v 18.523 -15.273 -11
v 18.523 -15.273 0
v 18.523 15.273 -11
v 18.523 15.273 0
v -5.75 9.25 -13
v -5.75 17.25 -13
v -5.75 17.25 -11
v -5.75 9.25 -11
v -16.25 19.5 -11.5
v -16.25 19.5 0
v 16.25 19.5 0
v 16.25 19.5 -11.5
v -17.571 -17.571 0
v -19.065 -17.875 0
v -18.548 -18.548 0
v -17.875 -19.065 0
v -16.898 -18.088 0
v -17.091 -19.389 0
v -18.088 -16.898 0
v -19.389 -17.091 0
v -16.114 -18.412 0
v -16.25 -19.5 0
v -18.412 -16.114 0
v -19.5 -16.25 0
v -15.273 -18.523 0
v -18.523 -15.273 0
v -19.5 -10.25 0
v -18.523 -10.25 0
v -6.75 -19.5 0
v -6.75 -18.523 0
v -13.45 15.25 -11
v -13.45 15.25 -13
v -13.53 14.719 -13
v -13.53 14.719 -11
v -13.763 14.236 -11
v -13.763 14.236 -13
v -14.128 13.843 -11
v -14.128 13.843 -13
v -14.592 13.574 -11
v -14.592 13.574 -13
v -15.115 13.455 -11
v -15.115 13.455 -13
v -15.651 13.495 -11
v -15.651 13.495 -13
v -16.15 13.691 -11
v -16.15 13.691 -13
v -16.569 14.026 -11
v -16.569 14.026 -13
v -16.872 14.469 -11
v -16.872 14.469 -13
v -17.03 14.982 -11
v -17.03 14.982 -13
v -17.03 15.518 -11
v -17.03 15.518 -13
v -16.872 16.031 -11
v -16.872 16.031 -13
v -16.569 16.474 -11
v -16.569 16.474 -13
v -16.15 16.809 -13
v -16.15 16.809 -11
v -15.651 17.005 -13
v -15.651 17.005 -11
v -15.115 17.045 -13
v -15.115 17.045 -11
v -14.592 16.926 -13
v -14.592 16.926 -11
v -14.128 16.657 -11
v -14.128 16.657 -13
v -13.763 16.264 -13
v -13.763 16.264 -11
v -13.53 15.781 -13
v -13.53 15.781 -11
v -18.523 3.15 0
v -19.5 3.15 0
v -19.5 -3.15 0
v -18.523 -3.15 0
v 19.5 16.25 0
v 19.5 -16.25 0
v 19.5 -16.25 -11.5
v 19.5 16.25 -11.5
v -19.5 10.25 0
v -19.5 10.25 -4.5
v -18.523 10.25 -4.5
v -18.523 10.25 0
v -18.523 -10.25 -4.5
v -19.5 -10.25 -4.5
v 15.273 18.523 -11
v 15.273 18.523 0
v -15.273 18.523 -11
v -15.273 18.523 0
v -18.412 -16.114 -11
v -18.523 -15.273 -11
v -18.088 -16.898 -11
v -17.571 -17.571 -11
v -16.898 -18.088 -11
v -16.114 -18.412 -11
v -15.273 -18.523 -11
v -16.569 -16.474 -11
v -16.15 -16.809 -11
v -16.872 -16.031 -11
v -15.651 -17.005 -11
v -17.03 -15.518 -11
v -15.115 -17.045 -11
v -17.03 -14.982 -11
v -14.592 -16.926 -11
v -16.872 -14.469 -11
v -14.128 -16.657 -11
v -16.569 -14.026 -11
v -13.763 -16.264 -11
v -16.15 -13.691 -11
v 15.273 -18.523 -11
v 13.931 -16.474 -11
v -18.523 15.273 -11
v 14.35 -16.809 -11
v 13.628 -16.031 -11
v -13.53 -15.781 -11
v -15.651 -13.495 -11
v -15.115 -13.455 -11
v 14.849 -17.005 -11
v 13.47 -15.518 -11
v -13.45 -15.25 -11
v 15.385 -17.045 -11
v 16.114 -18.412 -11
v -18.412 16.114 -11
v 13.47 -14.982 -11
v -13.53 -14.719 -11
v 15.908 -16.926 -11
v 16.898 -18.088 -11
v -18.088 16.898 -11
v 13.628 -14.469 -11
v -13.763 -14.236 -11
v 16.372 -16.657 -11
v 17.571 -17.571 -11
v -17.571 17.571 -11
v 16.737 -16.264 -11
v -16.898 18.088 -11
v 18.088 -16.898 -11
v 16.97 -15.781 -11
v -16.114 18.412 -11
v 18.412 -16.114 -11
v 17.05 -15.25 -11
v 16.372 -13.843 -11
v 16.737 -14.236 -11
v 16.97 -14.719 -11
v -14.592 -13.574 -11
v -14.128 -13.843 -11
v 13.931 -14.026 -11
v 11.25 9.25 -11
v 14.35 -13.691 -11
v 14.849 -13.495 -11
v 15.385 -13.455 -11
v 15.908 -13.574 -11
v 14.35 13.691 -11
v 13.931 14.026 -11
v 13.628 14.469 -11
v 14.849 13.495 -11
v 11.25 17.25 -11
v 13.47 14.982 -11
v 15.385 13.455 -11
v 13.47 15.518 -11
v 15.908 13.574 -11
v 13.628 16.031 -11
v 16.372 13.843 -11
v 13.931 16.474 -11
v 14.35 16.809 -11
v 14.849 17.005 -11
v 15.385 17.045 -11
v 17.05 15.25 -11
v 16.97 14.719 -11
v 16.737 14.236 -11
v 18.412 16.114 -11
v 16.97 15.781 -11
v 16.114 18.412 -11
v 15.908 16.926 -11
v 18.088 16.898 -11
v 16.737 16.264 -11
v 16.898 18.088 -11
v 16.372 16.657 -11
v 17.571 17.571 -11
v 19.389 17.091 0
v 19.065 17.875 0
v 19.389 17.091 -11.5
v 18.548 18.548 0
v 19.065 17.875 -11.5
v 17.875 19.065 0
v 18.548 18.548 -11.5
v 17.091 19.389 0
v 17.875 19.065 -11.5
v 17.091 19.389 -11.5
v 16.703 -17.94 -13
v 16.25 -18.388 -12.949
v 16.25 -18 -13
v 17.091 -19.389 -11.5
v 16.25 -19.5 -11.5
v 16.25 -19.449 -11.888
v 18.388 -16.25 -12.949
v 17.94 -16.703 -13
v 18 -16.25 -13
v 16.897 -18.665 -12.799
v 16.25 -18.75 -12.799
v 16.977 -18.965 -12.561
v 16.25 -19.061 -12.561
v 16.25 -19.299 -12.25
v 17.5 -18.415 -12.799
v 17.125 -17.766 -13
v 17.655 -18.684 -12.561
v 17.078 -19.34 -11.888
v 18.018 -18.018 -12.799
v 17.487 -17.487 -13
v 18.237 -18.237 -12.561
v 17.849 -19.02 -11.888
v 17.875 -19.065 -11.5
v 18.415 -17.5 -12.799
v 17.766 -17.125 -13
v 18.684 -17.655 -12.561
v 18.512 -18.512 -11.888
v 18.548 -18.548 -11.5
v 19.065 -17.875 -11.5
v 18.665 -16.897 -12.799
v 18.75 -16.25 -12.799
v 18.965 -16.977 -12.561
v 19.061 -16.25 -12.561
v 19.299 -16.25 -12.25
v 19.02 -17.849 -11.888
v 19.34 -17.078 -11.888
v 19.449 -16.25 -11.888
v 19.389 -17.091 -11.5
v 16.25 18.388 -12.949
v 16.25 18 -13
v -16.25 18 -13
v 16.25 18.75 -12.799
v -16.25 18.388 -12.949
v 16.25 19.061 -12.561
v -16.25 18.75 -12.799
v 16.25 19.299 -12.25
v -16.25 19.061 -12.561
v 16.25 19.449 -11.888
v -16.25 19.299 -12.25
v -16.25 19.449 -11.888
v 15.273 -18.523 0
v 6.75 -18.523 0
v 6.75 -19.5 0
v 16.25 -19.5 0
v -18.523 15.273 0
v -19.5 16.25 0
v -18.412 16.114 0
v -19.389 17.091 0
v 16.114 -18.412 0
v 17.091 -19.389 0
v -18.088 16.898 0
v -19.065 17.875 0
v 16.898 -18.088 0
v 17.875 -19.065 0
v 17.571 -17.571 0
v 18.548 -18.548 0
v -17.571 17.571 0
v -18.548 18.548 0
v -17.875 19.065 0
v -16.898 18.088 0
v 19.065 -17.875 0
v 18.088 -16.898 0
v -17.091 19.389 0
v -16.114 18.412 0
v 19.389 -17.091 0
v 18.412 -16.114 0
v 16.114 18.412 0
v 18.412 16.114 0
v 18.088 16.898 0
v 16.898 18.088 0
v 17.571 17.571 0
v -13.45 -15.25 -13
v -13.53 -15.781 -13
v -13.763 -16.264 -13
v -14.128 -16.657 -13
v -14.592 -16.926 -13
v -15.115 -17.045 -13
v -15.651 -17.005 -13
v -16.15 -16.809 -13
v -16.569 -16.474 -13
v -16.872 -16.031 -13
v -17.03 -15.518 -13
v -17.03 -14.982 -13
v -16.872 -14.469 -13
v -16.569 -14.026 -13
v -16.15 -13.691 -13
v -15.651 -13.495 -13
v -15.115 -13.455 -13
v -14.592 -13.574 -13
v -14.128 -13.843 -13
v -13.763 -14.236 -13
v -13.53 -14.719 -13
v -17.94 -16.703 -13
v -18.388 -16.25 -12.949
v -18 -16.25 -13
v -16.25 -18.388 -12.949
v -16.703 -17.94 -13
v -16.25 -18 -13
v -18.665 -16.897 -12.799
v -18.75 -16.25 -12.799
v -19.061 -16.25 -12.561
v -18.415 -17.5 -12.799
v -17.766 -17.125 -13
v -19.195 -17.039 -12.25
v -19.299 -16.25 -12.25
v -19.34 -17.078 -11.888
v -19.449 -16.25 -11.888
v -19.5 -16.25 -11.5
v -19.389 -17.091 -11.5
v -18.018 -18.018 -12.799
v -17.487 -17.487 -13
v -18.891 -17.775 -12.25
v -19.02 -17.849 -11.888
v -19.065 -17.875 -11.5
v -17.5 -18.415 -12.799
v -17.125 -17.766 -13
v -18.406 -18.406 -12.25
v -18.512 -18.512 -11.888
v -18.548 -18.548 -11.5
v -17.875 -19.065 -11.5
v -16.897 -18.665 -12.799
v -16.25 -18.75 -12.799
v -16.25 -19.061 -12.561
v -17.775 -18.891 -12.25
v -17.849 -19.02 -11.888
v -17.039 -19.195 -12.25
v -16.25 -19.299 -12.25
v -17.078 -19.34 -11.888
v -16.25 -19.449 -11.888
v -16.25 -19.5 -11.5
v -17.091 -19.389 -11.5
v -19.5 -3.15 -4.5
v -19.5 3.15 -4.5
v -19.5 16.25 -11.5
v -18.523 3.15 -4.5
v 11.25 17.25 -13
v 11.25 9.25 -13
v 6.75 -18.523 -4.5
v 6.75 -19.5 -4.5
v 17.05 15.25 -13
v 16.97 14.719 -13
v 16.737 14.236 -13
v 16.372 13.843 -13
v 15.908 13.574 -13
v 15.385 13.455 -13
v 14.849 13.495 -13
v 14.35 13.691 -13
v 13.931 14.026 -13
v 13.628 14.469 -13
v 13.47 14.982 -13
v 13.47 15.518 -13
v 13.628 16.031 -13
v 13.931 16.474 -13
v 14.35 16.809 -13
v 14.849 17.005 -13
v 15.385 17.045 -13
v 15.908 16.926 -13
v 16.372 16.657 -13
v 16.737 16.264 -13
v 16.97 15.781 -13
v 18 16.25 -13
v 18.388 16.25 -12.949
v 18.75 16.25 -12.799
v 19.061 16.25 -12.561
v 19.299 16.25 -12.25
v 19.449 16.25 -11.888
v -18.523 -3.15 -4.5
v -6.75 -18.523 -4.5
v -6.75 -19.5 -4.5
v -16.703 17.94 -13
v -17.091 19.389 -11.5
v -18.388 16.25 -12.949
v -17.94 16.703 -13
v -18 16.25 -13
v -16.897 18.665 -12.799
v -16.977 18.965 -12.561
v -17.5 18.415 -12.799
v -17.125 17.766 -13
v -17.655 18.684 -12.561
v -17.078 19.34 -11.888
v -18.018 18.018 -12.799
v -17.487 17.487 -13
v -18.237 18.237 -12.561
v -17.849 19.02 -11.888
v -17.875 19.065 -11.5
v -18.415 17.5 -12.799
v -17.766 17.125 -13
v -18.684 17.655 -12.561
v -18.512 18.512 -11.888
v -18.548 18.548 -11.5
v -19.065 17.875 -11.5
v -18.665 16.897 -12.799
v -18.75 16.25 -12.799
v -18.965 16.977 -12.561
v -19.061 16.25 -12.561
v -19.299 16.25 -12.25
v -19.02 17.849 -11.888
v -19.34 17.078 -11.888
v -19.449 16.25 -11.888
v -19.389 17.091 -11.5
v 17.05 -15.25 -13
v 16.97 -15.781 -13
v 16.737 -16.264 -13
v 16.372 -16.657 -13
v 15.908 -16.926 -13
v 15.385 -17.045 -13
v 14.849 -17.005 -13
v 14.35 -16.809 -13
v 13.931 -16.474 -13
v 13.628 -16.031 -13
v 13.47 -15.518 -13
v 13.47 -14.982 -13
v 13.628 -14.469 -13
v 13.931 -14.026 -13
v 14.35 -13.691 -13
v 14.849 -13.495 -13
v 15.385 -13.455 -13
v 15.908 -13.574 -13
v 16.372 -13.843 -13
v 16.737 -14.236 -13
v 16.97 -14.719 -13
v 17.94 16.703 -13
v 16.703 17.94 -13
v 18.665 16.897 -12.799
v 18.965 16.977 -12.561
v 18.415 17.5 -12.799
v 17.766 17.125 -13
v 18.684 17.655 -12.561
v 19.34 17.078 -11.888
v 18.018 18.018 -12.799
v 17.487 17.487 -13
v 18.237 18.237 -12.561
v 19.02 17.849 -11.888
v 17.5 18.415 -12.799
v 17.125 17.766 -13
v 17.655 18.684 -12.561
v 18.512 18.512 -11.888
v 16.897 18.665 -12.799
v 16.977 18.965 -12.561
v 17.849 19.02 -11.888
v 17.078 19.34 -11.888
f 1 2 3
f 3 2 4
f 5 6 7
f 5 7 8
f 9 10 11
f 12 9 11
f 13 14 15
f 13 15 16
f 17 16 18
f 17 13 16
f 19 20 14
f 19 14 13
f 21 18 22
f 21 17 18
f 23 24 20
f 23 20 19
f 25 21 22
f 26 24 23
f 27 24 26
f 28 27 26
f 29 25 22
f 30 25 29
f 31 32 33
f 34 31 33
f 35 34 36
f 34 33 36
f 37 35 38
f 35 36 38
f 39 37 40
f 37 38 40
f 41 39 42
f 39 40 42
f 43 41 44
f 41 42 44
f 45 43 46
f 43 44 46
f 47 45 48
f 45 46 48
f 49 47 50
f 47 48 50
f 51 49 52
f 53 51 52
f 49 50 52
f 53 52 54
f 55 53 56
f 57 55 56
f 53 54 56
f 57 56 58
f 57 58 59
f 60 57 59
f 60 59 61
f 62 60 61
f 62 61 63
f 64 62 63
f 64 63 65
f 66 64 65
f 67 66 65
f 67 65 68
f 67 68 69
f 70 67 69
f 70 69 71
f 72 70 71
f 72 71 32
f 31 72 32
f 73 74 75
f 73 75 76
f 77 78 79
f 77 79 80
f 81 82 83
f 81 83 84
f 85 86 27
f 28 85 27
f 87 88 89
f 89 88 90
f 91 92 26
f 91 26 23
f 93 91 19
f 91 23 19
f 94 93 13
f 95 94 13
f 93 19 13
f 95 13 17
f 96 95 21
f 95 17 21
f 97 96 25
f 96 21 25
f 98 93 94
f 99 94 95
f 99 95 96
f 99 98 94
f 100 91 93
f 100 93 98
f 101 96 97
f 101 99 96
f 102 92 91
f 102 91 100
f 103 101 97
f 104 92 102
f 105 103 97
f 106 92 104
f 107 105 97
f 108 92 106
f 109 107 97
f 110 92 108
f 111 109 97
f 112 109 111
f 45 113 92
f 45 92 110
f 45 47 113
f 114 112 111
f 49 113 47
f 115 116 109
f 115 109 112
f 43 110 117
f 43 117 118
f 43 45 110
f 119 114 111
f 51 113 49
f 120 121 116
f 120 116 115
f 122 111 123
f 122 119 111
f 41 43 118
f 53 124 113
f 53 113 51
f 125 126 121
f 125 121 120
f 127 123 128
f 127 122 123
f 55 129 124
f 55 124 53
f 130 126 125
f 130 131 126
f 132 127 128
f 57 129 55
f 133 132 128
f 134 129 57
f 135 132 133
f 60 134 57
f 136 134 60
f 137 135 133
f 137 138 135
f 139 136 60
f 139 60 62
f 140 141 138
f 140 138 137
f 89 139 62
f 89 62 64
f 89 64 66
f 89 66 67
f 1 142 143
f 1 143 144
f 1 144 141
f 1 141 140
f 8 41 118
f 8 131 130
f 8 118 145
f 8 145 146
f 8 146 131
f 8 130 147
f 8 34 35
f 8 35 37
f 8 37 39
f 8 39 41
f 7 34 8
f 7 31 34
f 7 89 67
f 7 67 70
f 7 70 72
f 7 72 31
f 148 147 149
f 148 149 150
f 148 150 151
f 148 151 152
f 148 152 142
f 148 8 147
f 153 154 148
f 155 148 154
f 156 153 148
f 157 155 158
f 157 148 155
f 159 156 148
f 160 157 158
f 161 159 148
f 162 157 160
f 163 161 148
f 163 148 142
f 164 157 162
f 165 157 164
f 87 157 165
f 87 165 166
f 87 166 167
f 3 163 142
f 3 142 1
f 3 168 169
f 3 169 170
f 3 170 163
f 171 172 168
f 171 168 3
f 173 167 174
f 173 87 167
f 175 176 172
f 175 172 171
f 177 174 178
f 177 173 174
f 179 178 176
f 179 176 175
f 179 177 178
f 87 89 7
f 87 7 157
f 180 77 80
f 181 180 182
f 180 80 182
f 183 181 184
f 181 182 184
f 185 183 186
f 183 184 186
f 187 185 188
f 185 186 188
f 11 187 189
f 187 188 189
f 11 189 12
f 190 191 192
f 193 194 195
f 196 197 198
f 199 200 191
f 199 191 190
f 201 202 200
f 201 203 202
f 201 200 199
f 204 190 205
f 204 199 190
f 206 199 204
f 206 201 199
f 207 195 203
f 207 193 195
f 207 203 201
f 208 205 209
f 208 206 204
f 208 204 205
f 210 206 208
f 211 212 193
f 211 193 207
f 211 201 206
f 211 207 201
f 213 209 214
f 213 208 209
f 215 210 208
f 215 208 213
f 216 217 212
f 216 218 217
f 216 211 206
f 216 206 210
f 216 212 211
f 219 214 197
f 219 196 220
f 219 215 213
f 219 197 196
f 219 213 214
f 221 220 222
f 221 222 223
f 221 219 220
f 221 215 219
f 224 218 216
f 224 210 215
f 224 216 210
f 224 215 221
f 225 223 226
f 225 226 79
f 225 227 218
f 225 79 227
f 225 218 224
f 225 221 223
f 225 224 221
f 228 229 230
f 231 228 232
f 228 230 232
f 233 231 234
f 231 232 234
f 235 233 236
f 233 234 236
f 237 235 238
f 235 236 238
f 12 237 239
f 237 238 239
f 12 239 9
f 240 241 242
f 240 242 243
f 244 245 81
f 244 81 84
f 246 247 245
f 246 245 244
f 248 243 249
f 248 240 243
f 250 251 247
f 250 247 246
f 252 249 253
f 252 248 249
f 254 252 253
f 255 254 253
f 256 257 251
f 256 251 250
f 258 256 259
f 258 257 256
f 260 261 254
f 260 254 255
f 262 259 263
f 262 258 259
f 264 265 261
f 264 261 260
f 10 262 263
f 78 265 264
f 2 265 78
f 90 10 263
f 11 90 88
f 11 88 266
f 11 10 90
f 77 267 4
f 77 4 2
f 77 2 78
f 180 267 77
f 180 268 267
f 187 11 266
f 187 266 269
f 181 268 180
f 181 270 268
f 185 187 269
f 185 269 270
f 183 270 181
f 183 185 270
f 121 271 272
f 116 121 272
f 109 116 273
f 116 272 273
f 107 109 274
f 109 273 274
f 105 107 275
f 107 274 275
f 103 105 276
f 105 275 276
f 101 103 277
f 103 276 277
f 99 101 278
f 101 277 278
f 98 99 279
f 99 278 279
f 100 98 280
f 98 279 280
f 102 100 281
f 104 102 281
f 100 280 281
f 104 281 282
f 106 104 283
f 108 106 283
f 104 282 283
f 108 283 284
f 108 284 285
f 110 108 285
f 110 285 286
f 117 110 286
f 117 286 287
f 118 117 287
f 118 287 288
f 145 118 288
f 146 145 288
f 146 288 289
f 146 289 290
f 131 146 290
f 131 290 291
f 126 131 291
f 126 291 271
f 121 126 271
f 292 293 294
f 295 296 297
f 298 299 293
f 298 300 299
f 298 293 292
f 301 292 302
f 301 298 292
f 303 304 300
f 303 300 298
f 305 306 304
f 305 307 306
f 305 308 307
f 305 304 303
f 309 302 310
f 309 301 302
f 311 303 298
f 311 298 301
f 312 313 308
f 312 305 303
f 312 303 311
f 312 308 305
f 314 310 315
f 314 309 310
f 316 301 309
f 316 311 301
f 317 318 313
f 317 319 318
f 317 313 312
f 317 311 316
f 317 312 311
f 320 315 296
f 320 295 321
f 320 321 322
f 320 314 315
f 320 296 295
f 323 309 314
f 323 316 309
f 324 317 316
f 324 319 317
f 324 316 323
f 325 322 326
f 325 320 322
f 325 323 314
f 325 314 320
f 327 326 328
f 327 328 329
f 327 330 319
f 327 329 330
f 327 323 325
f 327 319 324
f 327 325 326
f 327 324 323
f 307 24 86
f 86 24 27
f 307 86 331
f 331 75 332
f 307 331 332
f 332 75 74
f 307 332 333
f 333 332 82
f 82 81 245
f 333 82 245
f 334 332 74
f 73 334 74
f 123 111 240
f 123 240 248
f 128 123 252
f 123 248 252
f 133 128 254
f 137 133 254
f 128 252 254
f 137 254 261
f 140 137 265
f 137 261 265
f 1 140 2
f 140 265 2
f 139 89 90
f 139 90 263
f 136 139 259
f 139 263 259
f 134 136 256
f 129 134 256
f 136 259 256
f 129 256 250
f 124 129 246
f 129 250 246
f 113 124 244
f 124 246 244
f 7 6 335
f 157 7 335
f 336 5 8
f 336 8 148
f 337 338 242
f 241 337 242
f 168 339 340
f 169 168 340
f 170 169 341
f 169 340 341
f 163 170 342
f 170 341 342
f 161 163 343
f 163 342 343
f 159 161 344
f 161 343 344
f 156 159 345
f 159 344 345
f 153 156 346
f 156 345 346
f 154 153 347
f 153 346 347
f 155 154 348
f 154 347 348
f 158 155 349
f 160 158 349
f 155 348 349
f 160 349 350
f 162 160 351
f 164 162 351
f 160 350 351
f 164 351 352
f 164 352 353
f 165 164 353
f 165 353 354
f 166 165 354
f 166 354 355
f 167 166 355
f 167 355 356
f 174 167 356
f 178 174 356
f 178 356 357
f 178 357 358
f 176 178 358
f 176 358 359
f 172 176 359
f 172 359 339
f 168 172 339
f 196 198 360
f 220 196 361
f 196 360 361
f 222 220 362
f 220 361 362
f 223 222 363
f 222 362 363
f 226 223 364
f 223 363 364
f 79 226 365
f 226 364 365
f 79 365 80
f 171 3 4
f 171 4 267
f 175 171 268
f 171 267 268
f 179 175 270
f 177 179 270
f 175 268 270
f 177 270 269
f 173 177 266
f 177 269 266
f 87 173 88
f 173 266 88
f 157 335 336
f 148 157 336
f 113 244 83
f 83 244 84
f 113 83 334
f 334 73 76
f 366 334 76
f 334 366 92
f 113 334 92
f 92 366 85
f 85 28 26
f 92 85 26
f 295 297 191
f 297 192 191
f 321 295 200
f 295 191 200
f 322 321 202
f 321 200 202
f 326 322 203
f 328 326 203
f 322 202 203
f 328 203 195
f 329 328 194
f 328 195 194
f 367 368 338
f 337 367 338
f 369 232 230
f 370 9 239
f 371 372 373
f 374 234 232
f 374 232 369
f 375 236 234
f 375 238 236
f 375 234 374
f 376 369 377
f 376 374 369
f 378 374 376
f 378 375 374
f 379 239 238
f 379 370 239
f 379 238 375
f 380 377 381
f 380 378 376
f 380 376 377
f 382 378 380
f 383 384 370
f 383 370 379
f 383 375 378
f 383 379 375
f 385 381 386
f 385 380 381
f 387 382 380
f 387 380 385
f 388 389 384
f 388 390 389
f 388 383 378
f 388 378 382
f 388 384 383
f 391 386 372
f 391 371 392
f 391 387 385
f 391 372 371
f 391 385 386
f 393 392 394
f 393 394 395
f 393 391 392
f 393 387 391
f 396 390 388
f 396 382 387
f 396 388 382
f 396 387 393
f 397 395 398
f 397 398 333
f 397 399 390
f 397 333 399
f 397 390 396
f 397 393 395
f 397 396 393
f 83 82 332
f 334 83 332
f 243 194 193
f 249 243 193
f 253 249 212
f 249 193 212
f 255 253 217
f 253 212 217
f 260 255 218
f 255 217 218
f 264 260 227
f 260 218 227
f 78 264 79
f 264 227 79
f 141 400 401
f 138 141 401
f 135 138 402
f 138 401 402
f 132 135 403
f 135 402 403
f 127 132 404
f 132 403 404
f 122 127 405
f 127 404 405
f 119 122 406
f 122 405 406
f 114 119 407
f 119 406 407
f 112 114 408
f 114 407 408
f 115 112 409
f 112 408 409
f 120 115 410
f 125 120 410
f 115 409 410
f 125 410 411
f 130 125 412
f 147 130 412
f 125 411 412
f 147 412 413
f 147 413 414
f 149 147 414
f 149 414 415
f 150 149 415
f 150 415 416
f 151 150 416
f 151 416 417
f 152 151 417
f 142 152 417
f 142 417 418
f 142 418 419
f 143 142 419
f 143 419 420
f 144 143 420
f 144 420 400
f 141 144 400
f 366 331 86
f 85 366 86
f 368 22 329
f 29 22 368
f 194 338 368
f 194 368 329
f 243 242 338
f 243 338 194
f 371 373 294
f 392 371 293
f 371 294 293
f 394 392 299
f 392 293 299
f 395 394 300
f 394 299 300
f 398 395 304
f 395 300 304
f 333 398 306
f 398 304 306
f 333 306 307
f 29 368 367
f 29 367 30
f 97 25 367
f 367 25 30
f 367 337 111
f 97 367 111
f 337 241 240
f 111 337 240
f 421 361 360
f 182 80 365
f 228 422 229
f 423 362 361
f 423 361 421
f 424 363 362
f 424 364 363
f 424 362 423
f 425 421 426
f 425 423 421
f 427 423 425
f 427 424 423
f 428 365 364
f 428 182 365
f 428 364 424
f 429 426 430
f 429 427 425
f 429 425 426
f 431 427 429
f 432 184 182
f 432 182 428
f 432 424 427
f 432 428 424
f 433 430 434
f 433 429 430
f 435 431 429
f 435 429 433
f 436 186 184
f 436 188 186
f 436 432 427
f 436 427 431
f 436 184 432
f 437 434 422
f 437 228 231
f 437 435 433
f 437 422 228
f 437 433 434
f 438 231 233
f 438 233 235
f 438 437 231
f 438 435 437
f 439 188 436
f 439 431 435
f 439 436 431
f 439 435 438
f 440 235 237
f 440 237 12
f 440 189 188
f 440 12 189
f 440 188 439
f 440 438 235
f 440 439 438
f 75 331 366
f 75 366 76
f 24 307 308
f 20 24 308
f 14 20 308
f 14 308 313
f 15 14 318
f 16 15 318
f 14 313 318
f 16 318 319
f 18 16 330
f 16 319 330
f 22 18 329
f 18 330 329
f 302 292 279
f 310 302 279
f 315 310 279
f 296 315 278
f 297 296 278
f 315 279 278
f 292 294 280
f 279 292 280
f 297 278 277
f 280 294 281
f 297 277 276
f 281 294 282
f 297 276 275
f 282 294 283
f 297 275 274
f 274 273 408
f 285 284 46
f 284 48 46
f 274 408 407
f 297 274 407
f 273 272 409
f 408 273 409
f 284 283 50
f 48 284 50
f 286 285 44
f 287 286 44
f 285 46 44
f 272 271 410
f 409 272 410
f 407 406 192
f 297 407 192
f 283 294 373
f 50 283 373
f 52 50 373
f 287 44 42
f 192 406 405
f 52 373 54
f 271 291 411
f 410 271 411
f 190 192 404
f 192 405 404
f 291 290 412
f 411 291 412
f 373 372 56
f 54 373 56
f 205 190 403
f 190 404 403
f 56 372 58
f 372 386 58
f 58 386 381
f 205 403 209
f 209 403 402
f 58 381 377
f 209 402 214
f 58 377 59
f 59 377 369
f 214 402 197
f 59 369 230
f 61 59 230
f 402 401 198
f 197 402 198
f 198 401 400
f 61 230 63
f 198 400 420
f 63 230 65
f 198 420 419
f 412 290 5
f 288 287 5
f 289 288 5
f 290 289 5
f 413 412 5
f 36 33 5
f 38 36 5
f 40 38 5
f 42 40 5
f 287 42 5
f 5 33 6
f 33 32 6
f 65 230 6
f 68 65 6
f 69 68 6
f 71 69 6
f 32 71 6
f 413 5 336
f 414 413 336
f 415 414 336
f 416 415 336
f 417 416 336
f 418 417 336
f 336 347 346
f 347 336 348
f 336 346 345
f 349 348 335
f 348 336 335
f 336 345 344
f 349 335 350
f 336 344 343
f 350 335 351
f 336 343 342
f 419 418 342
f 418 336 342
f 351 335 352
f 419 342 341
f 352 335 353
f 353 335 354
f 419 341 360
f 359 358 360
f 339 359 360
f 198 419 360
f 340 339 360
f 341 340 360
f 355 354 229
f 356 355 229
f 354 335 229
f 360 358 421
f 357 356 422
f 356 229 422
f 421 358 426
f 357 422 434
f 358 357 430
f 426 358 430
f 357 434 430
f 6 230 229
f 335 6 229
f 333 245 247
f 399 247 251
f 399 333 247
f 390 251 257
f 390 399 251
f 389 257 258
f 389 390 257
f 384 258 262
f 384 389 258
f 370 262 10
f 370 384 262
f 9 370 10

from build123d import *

# Parameters (mm, degrees)
F0_W      = 39
F0_H      = 39
F1_DEPTH  = 13
F3_R      = 3.25
F5_DEPTH  = 11
F2_R      = 1.8
F2_W      = 17
F2_H      = 8
F6_DEPTH  = 13.001
F7_R      = 1.5
F12_W     = 7.1
F12_H     = 4.5
F13_DEPTH = 0.97705
F14_W     = 13.5
F14_H     = 4.5
F15_DEPTH = 0.97705


with BuildPart() as f1:
    # F0 (on Top) → F1 (new body)
    with BuildSketch(Plane.XY):
        Rectangle(F0_W, F0_H)
    extrude(amount=-F1_DEPTH)

    # F3
    f3_edges = [f1.edges().sort_by_distance(p)[0] for p in [
        (-19.5, -19.5, -6.5),
        (19.5, -19.5, -6.5),
        (19.5, 19.5, -6.5),
        (-19.5, 19.5, -6.5),
    ]]
    fillet(f3_edges, radius=F3_R)

    # F4 (on Top) → F5 (cut)
    with BuildSketch(Plane.XY):
        with BuildLine():
            ThreePointArc((-18.52295, -15.27295), (-17.571047, -17.571047), (-15.27295, -18.52295))
            Line((-15.27295, -18.52295), (15.27295, -18.52295))
            ThreePointArc((15.27295, -18.52295), (17.571047, -17.571047), (18.52295, -15.27295))
            Line((18.52295, -15.27295), (18.52295, 15.27295))
            ThreePointArc((18.52295, 15.27295), (17.571047, 17.571047), (15.27295, 18.52295))
            Line((15.27295, 18.52295), (-15.27295, 18.52295))
            ThreePointArc((-15.27295, 18.52295), (-17.571047, 17.571047), (-18.52295, 15.27295))
            Line((-18.52295, 15.27295), (-18.52295, -15.27295))
        make_face()
    extrude(amount=-F5_DEPTH, mode=Mode.SUBTRACT)

    # F2 (on face) → F6 (cut, through all)
    with BuildSketch(Plane(origin=(0, 0, -13), x_dir=(1, 0, 0), z_dir=(0, 0, -1))):
        with Locations((-15.25, 15.25)):
            Circle(F2_R)
        with Locations((15.25, 15.25)):
            Circle(F2_R)
        with Locations((-15.25, -15.25)):
            Circle(F2_R)
        with Locations((15.25, -15.25)):
            Circle(F2_R)
        with Locations((2.75, -13.25)):
            Rectangle(F2_W, F2_H)
    extrude(amount=-F6_DEPTH, mode=Mode.SUBTRACT)

    # F7
    f7_edges = [f1.edges().sort_by_distance(p)[0] for p in [
        (0, -19.5, -13),
    ]]
    fillet(f7_edges, radius=F7_R)

    # F12 (on face) → F13 (cut, through all)
    with BuildSketch(Plane(origin=(-19.5, 0, 0), x_dir=(0, -1, 0), z_dir=(-1, 0, 0))):
        with Locations((6.7, -2.25)):
            Rectangle(F12_W, F12_H)
        with Locations((-6.7, -2.25)):
            Rectangle(F12_W, F12_H)
    extrude(amount=-F13_DEPTH, mode=Mode.SUBTRACT)

    # F14 (on face) → F15 (cut, through all)
    with BuildSketch(Plane.XZ.offset(19.5)):
        with Locations((0, -2.25)):
            Rectangle(F14_W, F14_H)
    extrude(amount=-F15_DEPTH, mode=Mode.SUBTRACT)


solid = f1.part
